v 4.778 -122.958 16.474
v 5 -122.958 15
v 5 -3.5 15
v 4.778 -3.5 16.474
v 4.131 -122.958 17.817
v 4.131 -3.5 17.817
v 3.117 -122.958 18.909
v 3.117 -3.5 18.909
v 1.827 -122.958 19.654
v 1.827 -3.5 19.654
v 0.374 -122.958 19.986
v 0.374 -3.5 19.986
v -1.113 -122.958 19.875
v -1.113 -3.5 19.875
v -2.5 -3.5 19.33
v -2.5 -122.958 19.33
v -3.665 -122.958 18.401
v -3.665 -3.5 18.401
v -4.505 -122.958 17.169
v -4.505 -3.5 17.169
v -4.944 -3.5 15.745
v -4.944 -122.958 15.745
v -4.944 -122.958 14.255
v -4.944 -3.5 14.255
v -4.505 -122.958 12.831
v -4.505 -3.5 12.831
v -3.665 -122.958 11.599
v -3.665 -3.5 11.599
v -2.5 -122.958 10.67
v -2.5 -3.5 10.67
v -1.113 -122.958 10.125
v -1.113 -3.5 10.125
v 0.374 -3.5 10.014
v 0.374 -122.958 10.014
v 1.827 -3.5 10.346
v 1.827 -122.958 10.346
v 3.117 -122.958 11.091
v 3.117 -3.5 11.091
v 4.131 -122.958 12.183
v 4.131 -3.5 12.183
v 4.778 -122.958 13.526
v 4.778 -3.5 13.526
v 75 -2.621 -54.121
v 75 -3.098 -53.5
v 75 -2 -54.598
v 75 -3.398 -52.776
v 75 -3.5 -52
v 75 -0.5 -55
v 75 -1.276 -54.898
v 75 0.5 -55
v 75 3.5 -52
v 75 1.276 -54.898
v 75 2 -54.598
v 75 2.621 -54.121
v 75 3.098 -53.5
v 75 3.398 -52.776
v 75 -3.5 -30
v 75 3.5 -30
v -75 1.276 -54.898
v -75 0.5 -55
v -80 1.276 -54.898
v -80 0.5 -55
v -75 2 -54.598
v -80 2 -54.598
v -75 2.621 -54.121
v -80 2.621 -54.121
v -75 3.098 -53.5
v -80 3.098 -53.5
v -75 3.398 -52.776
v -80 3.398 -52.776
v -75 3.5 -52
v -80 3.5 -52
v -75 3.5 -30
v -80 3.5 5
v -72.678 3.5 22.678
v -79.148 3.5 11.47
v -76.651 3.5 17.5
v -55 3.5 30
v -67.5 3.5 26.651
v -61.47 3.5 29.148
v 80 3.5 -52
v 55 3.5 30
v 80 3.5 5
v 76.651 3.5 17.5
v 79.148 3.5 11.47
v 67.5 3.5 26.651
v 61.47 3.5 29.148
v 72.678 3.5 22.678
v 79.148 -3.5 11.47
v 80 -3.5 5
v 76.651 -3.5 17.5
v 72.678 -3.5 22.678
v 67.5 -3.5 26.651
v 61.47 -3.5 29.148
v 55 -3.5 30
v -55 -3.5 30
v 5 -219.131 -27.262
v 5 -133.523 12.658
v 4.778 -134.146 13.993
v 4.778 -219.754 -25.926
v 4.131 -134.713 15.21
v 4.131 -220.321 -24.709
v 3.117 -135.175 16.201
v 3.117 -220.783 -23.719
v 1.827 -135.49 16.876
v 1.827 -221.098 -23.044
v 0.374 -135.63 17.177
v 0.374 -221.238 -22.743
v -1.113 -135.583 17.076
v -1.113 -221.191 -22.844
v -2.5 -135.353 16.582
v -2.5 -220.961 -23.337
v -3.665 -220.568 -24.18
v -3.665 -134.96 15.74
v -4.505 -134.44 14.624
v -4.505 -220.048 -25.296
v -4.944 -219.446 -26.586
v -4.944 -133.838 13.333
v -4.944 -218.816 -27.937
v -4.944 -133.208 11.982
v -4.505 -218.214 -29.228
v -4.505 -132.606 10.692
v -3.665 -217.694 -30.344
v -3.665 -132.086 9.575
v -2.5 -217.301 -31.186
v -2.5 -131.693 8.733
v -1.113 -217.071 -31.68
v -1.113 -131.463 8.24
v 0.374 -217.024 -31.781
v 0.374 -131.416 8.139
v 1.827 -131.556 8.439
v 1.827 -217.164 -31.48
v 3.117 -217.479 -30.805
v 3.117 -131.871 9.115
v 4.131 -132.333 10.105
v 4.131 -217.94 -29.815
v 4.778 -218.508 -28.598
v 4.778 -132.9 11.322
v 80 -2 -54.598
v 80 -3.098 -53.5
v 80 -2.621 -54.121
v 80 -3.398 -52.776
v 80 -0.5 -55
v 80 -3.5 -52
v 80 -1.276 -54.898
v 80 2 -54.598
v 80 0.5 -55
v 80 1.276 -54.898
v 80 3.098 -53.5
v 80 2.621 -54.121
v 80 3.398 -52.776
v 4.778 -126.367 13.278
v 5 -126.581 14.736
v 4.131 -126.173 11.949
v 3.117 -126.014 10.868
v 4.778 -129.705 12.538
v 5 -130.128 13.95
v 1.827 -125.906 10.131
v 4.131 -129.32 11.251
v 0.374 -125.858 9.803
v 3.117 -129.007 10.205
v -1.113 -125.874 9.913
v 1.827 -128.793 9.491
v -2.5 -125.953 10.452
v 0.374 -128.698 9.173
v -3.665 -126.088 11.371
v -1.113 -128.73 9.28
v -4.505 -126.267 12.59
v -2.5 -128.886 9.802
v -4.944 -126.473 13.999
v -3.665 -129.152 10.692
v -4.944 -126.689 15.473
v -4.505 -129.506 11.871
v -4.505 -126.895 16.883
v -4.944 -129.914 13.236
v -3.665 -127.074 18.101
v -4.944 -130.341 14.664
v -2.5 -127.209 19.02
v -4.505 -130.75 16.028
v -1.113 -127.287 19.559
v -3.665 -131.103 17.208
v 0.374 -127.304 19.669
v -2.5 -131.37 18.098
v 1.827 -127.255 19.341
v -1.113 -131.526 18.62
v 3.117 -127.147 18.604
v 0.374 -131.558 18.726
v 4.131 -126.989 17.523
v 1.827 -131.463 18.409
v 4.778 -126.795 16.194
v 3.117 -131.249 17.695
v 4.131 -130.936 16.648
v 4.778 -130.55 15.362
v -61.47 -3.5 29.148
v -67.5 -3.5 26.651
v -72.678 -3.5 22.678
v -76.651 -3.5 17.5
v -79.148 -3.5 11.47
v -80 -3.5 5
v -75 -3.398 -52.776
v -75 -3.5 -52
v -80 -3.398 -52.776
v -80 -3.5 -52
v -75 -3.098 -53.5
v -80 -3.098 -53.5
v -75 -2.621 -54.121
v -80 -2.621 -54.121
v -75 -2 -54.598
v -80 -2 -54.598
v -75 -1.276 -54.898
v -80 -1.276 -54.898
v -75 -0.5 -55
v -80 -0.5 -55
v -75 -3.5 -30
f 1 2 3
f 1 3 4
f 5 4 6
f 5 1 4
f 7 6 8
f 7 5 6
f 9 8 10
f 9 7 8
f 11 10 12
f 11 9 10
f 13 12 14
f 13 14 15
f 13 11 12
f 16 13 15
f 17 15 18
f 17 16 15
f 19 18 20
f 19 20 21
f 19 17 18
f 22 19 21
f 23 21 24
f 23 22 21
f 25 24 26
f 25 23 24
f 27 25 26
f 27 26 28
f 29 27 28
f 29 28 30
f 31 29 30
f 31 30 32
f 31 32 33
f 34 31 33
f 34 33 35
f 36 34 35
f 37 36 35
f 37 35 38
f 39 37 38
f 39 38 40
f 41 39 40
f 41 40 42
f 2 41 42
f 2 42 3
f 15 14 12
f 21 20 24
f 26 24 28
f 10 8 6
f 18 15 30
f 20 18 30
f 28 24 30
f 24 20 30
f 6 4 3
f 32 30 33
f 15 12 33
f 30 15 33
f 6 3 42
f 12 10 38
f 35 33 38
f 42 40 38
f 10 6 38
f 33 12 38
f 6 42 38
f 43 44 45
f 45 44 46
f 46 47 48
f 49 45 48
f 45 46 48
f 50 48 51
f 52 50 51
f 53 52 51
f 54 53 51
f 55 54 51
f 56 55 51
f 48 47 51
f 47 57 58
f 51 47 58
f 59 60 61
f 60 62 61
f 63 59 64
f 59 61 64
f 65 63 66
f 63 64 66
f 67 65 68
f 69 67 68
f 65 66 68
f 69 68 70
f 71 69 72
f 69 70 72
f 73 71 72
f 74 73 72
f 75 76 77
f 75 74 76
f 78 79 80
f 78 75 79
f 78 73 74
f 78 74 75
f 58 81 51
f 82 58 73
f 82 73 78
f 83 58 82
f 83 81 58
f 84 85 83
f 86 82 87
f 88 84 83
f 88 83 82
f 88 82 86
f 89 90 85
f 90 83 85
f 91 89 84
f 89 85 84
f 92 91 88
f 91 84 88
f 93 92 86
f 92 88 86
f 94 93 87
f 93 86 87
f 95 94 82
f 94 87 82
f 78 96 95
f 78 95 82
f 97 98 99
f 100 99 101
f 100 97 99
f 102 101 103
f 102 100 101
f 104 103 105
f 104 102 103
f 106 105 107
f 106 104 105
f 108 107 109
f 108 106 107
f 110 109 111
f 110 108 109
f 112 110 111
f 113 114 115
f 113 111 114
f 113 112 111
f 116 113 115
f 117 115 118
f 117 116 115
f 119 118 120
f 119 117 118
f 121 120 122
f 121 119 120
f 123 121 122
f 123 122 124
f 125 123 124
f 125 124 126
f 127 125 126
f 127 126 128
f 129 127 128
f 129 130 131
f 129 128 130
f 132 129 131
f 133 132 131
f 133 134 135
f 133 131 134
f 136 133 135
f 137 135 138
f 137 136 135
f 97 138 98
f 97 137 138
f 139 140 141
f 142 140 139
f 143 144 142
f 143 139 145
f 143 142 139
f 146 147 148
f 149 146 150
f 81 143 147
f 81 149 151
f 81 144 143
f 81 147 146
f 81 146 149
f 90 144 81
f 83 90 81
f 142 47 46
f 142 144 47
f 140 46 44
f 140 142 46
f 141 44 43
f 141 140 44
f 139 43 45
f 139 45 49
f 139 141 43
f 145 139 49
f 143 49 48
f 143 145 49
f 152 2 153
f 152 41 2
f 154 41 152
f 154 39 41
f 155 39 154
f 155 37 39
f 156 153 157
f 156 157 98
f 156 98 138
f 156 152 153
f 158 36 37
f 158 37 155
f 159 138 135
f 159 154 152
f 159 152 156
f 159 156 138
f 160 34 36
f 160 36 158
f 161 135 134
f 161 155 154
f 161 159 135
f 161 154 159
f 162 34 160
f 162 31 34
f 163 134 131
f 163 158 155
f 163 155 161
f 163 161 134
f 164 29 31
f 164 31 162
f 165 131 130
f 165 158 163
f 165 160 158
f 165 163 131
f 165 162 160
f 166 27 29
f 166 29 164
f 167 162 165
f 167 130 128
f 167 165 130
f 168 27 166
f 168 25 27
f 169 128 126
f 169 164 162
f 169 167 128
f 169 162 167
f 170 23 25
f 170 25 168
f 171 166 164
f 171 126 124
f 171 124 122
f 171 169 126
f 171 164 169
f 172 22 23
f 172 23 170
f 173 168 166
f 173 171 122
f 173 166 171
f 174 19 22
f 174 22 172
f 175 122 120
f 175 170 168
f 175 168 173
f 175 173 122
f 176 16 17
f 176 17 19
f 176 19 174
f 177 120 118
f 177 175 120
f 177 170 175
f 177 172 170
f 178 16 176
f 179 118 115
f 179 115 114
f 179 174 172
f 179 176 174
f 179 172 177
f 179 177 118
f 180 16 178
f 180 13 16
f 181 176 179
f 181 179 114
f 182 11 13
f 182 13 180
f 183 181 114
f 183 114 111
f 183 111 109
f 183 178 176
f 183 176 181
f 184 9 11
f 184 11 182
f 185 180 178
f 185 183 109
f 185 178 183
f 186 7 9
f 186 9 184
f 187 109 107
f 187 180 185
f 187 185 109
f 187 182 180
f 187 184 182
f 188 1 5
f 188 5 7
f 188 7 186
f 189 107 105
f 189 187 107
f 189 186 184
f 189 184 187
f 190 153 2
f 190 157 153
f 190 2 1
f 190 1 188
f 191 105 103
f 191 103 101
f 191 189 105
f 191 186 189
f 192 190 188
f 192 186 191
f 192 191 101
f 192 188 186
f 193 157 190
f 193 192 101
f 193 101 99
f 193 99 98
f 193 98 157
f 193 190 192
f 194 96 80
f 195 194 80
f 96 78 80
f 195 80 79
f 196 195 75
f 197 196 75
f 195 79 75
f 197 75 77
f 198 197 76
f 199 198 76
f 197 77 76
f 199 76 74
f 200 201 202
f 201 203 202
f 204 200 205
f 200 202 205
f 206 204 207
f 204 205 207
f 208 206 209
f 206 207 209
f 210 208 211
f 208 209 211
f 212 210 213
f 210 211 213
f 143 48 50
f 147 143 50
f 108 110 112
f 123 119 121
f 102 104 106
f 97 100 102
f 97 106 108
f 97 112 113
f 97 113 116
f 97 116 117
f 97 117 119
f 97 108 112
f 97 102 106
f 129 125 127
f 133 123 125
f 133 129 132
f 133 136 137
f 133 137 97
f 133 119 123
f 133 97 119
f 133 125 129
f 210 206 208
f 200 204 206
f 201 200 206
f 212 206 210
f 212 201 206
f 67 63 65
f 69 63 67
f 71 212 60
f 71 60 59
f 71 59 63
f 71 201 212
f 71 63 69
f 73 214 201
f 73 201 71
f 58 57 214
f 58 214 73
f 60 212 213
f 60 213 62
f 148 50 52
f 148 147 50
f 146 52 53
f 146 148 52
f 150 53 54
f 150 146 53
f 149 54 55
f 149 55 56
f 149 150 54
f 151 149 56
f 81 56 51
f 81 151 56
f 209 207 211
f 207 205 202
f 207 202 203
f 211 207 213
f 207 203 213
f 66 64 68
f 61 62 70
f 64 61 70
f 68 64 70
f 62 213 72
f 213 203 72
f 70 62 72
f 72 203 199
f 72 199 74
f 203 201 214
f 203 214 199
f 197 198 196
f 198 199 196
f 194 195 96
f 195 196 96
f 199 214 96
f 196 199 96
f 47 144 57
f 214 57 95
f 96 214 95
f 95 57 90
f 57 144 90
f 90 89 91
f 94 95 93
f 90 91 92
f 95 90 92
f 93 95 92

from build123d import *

# Parameters (mm, degrees)
F0_W          = 7
F0_H          = 60
F1_DEPTH      = 75
F1_DEPTH_BACK = 75
F2_W          = 7
F2_H          = 85
F3_DEPTH      = 5
F5_R          = 25
F6_R          = 3
F7_R          = 5


with BuildPart() as f1:
    # F0 (on Right) → F1 (new body, two sides)
    with BuildSketch(Plane.YZ) as f1_sk:
        Rectangle(F0_W, F0_H)
    extrude(amount=F1_DEPTH)
    extrude(f1_sk.sketch, amount=-F1_DEPTH_BACK)

    # F2 (on face) → F3 (join)
    with BuildSketch(Plane.YZ.offset(75)):
        with Locations((0, -12.5)):
            Rectangle(F2_W, F2_H)
    extrude(amount=F3_DEPTH)

    # F4: F1 across plane


with BuildPart() as f1_1:
    add(f1.part)
    add(f1.part.mirror(Plane.YZ))

    # F5
    f5_edges = [f1_1.edges().sort_by_distance(p)[0] for p in [
        (-80, 0, 30),
        (80, 0, 30),
    ]]
    fillet(f5_edges, radius=F5_R)

    # F6
    f6_edges = [f1_1.edges().sort_by_distance(p)[0] for p in [
        (-77.5, -3.5, -55),
        (77.5, -3.5, -55),
        (-77.5, 3.5, -55),
        (77.5, 3.5, -55),
    ]]
    fillet(f6_edges, radius=F6_R)


with BuildPart() as f9:
    # F9: sweep along a path in F8
    with BuildLine(Plane.YZ) as f9_path:
        Line((-3.5, 15), (-122.9576334339, 15))
        ThreePointArc((-122.9576334339, 15), (-128.3686237824, 14.407400178), (-133.5230899774, 12.6576946759))
        Line((-133.5230899774, 12.6576946759), (-219.1307787037, -27.2618261741))
    # F7 (on face) → F9 (sweep)
    with BuildSketch(Plane.XZ.offset(3.5)):
        with Locations((0, 15)):
            Circle(F7_R)
    sweep(path=f9_path.line)


solid = Compound([f1_1.part, f9.part])
